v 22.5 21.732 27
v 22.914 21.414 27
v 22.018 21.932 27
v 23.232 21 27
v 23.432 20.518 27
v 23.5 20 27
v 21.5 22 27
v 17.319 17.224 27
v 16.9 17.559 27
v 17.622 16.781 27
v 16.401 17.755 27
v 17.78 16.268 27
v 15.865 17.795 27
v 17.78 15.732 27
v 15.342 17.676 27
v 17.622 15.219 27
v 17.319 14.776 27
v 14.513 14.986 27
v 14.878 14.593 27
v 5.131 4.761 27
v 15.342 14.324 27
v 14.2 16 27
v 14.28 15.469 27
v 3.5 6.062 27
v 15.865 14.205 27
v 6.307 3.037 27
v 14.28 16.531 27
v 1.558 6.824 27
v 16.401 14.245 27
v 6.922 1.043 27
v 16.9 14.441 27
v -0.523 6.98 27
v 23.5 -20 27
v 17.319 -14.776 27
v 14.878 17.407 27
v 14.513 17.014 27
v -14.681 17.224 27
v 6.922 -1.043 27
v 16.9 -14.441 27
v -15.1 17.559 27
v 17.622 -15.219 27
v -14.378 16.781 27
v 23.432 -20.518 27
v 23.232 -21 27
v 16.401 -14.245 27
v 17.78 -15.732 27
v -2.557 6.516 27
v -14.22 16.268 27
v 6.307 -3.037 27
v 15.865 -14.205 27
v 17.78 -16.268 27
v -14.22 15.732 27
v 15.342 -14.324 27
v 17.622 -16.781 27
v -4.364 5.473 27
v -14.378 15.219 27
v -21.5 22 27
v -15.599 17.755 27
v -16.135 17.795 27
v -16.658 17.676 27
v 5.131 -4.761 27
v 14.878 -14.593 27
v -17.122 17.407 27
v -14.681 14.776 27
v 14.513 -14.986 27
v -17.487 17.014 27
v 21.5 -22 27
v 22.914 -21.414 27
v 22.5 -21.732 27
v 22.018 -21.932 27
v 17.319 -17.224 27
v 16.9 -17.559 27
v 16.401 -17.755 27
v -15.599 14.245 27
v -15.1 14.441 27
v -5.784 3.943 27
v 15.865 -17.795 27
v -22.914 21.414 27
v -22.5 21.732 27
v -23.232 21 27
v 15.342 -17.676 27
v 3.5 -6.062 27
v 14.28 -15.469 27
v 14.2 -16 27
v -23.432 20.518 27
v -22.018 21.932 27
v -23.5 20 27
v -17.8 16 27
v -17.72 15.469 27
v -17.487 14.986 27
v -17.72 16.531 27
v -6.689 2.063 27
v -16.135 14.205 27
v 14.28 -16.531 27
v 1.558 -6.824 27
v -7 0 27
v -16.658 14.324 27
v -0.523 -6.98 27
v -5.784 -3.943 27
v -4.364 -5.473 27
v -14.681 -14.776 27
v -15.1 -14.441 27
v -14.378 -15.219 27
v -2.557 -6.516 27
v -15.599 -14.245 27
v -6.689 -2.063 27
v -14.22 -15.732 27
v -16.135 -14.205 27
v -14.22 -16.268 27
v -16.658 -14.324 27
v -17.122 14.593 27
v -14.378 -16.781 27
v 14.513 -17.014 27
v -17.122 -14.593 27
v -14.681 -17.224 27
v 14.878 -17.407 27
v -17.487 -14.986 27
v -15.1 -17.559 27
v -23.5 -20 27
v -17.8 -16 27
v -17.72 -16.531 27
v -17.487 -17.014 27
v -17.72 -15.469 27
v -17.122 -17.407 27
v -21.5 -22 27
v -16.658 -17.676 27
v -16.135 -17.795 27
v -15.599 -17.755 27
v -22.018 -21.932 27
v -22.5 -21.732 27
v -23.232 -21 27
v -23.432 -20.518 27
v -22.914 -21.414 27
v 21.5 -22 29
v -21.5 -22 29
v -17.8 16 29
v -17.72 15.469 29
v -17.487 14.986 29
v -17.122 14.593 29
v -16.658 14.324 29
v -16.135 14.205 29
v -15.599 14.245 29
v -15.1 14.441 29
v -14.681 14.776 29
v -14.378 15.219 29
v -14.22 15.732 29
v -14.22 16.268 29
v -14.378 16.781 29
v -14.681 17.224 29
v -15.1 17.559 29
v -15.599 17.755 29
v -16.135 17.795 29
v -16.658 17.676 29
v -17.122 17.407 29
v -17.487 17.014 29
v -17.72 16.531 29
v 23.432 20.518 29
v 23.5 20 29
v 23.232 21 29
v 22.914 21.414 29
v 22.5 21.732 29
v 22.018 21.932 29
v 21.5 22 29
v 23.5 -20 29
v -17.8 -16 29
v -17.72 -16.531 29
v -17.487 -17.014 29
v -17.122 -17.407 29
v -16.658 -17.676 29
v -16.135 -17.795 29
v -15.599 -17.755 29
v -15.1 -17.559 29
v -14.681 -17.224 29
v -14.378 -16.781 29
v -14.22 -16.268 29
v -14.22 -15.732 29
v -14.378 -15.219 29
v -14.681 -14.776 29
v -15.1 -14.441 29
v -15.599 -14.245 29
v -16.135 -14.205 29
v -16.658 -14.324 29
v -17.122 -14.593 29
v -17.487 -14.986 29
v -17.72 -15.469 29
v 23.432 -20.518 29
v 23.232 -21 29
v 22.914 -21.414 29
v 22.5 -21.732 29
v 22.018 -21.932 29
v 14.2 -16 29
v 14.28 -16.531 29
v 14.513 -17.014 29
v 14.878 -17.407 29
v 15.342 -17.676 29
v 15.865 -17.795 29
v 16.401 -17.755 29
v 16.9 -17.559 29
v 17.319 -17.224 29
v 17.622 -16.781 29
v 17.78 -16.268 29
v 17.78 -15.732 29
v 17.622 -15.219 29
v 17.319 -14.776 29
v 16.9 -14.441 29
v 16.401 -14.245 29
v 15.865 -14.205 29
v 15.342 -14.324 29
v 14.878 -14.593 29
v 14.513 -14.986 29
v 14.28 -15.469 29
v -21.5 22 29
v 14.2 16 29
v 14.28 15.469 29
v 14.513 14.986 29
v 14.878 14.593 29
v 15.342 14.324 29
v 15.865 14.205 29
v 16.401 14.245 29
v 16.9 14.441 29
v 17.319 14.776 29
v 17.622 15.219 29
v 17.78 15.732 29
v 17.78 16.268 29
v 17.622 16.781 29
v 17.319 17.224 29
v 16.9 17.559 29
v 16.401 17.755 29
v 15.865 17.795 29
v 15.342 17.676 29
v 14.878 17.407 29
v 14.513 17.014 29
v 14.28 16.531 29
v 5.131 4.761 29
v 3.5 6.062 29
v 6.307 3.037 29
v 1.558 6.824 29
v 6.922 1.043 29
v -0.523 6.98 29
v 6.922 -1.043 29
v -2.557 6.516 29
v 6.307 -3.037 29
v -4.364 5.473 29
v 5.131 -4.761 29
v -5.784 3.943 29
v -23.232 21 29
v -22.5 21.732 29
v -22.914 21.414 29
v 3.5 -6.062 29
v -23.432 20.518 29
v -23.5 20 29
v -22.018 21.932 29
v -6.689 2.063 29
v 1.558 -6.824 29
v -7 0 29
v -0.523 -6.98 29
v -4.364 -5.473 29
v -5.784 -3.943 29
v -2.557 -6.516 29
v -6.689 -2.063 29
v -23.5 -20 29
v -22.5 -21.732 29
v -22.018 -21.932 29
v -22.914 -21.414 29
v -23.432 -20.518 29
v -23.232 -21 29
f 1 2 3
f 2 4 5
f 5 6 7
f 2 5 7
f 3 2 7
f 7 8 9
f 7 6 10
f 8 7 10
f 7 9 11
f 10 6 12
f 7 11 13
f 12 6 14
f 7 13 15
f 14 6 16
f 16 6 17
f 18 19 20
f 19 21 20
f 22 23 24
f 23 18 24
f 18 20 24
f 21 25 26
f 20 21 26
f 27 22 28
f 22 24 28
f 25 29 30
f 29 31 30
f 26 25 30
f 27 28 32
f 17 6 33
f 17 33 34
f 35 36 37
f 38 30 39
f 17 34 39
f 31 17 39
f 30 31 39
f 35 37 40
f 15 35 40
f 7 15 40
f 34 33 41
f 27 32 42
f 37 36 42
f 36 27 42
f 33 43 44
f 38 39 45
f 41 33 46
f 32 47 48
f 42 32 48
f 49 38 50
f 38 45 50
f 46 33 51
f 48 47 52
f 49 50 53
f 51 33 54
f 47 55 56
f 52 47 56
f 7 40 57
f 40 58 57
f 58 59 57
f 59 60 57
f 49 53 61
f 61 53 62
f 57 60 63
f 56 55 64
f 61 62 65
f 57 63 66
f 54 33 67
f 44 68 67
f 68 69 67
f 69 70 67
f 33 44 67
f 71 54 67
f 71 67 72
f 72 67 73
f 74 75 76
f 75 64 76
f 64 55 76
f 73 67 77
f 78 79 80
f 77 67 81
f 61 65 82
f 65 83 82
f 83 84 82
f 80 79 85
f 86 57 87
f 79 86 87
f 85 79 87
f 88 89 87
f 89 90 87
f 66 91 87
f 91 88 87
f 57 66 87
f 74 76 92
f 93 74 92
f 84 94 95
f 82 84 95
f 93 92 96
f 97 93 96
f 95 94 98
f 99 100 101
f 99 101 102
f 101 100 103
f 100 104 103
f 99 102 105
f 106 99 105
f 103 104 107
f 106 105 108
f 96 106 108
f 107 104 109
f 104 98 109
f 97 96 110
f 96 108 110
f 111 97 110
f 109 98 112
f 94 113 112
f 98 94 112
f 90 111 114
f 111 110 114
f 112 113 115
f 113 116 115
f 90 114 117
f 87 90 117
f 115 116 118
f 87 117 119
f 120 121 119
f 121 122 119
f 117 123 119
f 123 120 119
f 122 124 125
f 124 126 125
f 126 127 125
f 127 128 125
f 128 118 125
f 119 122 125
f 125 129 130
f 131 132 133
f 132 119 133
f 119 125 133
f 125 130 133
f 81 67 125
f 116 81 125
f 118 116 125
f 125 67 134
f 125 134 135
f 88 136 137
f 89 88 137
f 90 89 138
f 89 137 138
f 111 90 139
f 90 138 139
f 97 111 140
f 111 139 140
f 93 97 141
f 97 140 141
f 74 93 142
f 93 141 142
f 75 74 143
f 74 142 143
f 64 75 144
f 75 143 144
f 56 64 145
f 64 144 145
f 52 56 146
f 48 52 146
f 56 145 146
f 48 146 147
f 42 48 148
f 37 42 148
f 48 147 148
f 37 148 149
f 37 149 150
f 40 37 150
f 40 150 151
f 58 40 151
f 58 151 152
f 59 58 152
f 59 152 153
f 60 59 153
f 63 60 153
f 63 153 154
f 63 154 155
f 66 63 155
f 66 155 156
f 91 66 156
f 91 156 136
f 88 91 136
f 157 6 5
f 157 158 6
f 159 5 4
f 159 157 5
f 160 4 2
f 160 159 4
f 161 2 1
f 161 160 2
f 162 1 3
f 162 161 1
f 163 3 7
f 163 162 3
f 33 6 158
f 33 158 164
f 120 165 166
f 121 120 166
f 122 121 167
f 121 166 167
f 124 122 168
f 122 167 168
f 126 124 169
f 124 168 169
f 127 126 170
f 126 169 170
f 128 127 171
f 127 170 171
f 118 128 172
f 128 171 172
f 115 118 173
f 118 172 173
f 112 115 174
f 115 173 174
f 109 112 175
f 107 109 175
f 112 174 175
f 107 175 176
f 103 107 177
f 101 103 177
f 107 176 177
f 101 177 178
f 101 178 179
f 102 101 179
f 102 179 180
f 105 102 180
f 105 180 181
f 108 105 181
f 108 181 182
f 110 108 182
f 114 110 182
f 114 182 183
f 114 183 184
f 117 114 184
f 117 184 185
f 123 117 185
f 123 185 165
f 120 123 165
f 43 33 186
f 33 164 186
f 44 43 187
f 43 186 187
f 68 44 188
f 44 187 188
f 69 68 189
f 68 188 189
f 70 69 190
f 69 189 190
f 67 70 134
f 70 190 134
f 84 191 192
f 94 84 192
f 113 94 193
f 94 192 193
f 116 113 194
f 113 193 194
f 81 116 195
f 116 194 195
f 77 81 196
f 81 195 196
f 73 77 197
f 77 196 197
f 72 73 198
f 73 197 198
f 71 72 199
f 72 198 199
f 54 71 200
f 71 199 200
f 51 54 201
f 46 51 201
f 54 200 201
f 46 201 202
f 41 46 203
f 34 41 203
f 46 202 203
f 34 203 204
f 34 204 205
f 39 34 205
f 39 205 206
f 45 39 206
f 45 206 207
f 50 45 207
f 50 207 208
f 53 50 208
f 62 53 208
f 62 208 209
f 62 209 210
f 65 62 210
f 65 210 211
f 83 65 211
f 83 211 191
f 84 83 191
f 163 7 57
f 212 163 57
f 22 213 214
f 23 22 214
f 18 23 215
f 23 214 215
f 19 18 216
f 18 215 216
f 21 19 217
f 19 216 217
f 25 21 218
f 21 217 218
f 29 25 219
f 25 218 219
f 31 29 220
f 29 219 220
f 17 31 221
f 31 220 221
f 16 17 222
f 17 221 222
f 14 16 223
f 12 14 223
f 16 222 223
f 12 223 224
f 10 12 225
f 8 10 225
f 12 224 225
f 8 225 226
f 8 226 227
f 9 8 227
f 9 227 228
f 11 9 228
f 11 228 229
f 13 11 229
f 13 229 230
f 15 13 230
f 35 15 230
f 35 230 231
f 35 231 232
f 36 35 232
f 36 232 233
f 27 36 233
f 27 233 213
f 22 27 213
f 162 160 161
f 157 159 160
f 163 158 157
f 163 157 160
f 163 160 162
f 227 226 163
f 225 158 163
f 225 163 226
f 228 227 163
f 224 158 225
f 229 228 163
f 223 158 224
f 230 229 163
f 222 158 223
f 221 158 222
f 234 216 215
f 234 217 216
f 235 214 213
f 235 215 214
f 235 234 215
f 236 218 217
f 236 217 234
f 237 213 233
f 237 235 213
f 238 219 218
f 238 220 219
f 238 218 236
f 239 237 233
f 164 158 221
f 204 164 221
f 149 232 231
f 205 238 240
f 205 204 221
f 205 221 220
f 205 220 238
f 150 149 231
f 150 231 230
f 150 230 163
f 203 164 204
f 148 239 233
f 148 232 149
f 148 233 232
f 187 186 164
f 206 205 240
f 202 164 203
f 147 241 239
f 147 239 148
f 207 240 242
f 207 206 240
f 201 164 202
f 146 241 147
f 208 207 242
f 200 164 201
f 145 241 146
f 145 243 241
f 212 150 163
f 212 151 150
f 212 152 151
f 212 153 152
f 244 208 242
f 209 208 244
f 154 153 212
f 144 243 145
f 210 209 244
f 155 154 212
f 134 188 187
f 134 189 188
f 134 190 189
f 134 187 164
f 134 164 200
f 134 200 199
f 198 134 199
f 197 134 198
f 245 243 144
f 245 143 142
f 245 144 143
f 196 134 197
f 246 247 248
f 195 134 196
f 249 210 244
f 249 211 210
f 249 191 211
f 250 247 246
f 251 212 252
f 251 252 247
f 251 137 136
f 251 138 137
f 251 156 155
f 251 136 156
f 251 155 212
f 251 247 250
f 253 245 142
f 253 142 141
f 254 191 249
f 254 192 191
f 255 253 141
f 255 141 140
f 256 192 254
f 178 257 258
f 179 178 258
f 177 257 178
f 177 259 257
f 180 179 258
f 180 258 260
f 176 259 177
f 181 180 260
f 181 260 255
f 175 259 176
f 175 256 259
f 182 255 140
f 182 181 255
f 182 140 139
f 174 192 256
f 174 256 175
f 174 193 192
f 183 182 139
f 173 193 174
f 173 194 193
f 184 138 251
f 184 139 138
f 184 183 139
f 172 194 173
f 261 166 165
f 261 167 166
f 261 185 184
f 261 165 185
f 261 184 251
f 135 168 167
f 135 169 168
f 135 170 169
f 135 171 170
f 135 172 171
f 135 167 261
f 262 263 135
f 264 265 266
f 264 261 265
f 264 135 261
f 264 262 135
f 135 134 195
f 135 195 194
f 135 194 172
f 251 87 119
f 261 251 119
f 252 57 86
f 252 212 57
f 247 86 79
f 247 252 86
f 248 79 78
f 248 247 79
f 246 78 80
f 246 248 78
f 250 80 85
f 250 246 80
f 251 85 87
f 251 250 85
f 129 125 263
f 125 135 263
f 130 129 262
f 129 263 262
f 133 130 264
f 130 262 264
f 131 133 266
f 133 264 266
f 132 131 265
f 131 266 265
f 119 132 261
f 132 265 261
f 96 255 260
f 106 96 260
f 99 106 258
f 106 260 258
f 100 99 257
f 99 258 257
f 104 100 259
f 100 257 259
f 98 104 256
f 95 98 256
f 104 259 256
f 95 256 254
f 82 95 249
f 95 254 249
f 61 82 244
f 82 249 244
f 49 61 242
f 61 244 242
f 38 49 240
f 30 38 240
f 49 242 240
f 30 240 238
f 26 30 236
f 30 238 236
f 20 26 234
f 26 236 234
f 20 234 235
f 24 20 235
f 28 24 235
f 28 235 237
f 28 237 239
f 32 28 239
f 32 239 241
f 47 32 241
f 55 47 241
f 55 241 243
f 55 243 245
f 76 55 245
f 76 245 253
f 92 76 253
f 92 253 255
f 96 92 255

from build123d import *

# Parameters (mm, degrees)
SKETCH019_W             = 47
SKETCH019_H             = 44
PAD004_DEPTH            = 2
SKETCH018_R             = 7
HOLE008_DEPTH           = 25
SKETCH017_R             = 1.8
HOLE007_DEPTH           = 25
FILLET002_R             = 2
BODY005_PLACEMENT_ANGLE = 180


with BuildPart() as part:
    # Sketch019 → Pad004 (new body)
    with BuildSketch(Plane.XY):
        Rectangle(SKETCH019_W, SKETCH019_H)
    extrude(amount=PAD004_DEPTH)

    # Sketch018 (on DatumPlane) → Hole008 (cut)
    with BuildSketch(Plane.XY.offset(2)):
        Circle(SKETCH018_R)
    extrude(amount=-HOLE008_DEPTH, mode=Mode.SUBTRACT)

    # Sketch017 (on DatumPlane) → Hole007 (cut)
    with BuildSketch(Plane.XY.offset(2)):
        with Locations((-16, 16)):
            Circle(SKETCH017_R)
        with Locations((16, 16)):
            Circle(SKETCH017_R)
        with Locations((-16, -16)):
            Circle(SKETCH017_R)
        with Locations((16, -16)):
            Circle(SKETCH017_R)
    extrude(amount=-HOLE007_DEPTH, mode=Mode.SUBTRACT)

    # Fillet002
    fillet002_edges = [part.edges().sort_by_distance(p)[0] for p in [
        (-23.5, -22, 1),
        (23.5, -22, 1),
        (23.5, 22, 1),
        (-23.5, 22, 1),
    ]]
    fillet(fillet002_edges, radius=FILLET002_R)


with BuildPart() as part_1:
    # Body005 placement: moved
    add(part.part.moved(Location((0, 0, 27))).rotate(Axis((0, 0, 27), (0, 0, 1)), BODY005_PLACEMENT_ANGLE))


solid = part_1.part
